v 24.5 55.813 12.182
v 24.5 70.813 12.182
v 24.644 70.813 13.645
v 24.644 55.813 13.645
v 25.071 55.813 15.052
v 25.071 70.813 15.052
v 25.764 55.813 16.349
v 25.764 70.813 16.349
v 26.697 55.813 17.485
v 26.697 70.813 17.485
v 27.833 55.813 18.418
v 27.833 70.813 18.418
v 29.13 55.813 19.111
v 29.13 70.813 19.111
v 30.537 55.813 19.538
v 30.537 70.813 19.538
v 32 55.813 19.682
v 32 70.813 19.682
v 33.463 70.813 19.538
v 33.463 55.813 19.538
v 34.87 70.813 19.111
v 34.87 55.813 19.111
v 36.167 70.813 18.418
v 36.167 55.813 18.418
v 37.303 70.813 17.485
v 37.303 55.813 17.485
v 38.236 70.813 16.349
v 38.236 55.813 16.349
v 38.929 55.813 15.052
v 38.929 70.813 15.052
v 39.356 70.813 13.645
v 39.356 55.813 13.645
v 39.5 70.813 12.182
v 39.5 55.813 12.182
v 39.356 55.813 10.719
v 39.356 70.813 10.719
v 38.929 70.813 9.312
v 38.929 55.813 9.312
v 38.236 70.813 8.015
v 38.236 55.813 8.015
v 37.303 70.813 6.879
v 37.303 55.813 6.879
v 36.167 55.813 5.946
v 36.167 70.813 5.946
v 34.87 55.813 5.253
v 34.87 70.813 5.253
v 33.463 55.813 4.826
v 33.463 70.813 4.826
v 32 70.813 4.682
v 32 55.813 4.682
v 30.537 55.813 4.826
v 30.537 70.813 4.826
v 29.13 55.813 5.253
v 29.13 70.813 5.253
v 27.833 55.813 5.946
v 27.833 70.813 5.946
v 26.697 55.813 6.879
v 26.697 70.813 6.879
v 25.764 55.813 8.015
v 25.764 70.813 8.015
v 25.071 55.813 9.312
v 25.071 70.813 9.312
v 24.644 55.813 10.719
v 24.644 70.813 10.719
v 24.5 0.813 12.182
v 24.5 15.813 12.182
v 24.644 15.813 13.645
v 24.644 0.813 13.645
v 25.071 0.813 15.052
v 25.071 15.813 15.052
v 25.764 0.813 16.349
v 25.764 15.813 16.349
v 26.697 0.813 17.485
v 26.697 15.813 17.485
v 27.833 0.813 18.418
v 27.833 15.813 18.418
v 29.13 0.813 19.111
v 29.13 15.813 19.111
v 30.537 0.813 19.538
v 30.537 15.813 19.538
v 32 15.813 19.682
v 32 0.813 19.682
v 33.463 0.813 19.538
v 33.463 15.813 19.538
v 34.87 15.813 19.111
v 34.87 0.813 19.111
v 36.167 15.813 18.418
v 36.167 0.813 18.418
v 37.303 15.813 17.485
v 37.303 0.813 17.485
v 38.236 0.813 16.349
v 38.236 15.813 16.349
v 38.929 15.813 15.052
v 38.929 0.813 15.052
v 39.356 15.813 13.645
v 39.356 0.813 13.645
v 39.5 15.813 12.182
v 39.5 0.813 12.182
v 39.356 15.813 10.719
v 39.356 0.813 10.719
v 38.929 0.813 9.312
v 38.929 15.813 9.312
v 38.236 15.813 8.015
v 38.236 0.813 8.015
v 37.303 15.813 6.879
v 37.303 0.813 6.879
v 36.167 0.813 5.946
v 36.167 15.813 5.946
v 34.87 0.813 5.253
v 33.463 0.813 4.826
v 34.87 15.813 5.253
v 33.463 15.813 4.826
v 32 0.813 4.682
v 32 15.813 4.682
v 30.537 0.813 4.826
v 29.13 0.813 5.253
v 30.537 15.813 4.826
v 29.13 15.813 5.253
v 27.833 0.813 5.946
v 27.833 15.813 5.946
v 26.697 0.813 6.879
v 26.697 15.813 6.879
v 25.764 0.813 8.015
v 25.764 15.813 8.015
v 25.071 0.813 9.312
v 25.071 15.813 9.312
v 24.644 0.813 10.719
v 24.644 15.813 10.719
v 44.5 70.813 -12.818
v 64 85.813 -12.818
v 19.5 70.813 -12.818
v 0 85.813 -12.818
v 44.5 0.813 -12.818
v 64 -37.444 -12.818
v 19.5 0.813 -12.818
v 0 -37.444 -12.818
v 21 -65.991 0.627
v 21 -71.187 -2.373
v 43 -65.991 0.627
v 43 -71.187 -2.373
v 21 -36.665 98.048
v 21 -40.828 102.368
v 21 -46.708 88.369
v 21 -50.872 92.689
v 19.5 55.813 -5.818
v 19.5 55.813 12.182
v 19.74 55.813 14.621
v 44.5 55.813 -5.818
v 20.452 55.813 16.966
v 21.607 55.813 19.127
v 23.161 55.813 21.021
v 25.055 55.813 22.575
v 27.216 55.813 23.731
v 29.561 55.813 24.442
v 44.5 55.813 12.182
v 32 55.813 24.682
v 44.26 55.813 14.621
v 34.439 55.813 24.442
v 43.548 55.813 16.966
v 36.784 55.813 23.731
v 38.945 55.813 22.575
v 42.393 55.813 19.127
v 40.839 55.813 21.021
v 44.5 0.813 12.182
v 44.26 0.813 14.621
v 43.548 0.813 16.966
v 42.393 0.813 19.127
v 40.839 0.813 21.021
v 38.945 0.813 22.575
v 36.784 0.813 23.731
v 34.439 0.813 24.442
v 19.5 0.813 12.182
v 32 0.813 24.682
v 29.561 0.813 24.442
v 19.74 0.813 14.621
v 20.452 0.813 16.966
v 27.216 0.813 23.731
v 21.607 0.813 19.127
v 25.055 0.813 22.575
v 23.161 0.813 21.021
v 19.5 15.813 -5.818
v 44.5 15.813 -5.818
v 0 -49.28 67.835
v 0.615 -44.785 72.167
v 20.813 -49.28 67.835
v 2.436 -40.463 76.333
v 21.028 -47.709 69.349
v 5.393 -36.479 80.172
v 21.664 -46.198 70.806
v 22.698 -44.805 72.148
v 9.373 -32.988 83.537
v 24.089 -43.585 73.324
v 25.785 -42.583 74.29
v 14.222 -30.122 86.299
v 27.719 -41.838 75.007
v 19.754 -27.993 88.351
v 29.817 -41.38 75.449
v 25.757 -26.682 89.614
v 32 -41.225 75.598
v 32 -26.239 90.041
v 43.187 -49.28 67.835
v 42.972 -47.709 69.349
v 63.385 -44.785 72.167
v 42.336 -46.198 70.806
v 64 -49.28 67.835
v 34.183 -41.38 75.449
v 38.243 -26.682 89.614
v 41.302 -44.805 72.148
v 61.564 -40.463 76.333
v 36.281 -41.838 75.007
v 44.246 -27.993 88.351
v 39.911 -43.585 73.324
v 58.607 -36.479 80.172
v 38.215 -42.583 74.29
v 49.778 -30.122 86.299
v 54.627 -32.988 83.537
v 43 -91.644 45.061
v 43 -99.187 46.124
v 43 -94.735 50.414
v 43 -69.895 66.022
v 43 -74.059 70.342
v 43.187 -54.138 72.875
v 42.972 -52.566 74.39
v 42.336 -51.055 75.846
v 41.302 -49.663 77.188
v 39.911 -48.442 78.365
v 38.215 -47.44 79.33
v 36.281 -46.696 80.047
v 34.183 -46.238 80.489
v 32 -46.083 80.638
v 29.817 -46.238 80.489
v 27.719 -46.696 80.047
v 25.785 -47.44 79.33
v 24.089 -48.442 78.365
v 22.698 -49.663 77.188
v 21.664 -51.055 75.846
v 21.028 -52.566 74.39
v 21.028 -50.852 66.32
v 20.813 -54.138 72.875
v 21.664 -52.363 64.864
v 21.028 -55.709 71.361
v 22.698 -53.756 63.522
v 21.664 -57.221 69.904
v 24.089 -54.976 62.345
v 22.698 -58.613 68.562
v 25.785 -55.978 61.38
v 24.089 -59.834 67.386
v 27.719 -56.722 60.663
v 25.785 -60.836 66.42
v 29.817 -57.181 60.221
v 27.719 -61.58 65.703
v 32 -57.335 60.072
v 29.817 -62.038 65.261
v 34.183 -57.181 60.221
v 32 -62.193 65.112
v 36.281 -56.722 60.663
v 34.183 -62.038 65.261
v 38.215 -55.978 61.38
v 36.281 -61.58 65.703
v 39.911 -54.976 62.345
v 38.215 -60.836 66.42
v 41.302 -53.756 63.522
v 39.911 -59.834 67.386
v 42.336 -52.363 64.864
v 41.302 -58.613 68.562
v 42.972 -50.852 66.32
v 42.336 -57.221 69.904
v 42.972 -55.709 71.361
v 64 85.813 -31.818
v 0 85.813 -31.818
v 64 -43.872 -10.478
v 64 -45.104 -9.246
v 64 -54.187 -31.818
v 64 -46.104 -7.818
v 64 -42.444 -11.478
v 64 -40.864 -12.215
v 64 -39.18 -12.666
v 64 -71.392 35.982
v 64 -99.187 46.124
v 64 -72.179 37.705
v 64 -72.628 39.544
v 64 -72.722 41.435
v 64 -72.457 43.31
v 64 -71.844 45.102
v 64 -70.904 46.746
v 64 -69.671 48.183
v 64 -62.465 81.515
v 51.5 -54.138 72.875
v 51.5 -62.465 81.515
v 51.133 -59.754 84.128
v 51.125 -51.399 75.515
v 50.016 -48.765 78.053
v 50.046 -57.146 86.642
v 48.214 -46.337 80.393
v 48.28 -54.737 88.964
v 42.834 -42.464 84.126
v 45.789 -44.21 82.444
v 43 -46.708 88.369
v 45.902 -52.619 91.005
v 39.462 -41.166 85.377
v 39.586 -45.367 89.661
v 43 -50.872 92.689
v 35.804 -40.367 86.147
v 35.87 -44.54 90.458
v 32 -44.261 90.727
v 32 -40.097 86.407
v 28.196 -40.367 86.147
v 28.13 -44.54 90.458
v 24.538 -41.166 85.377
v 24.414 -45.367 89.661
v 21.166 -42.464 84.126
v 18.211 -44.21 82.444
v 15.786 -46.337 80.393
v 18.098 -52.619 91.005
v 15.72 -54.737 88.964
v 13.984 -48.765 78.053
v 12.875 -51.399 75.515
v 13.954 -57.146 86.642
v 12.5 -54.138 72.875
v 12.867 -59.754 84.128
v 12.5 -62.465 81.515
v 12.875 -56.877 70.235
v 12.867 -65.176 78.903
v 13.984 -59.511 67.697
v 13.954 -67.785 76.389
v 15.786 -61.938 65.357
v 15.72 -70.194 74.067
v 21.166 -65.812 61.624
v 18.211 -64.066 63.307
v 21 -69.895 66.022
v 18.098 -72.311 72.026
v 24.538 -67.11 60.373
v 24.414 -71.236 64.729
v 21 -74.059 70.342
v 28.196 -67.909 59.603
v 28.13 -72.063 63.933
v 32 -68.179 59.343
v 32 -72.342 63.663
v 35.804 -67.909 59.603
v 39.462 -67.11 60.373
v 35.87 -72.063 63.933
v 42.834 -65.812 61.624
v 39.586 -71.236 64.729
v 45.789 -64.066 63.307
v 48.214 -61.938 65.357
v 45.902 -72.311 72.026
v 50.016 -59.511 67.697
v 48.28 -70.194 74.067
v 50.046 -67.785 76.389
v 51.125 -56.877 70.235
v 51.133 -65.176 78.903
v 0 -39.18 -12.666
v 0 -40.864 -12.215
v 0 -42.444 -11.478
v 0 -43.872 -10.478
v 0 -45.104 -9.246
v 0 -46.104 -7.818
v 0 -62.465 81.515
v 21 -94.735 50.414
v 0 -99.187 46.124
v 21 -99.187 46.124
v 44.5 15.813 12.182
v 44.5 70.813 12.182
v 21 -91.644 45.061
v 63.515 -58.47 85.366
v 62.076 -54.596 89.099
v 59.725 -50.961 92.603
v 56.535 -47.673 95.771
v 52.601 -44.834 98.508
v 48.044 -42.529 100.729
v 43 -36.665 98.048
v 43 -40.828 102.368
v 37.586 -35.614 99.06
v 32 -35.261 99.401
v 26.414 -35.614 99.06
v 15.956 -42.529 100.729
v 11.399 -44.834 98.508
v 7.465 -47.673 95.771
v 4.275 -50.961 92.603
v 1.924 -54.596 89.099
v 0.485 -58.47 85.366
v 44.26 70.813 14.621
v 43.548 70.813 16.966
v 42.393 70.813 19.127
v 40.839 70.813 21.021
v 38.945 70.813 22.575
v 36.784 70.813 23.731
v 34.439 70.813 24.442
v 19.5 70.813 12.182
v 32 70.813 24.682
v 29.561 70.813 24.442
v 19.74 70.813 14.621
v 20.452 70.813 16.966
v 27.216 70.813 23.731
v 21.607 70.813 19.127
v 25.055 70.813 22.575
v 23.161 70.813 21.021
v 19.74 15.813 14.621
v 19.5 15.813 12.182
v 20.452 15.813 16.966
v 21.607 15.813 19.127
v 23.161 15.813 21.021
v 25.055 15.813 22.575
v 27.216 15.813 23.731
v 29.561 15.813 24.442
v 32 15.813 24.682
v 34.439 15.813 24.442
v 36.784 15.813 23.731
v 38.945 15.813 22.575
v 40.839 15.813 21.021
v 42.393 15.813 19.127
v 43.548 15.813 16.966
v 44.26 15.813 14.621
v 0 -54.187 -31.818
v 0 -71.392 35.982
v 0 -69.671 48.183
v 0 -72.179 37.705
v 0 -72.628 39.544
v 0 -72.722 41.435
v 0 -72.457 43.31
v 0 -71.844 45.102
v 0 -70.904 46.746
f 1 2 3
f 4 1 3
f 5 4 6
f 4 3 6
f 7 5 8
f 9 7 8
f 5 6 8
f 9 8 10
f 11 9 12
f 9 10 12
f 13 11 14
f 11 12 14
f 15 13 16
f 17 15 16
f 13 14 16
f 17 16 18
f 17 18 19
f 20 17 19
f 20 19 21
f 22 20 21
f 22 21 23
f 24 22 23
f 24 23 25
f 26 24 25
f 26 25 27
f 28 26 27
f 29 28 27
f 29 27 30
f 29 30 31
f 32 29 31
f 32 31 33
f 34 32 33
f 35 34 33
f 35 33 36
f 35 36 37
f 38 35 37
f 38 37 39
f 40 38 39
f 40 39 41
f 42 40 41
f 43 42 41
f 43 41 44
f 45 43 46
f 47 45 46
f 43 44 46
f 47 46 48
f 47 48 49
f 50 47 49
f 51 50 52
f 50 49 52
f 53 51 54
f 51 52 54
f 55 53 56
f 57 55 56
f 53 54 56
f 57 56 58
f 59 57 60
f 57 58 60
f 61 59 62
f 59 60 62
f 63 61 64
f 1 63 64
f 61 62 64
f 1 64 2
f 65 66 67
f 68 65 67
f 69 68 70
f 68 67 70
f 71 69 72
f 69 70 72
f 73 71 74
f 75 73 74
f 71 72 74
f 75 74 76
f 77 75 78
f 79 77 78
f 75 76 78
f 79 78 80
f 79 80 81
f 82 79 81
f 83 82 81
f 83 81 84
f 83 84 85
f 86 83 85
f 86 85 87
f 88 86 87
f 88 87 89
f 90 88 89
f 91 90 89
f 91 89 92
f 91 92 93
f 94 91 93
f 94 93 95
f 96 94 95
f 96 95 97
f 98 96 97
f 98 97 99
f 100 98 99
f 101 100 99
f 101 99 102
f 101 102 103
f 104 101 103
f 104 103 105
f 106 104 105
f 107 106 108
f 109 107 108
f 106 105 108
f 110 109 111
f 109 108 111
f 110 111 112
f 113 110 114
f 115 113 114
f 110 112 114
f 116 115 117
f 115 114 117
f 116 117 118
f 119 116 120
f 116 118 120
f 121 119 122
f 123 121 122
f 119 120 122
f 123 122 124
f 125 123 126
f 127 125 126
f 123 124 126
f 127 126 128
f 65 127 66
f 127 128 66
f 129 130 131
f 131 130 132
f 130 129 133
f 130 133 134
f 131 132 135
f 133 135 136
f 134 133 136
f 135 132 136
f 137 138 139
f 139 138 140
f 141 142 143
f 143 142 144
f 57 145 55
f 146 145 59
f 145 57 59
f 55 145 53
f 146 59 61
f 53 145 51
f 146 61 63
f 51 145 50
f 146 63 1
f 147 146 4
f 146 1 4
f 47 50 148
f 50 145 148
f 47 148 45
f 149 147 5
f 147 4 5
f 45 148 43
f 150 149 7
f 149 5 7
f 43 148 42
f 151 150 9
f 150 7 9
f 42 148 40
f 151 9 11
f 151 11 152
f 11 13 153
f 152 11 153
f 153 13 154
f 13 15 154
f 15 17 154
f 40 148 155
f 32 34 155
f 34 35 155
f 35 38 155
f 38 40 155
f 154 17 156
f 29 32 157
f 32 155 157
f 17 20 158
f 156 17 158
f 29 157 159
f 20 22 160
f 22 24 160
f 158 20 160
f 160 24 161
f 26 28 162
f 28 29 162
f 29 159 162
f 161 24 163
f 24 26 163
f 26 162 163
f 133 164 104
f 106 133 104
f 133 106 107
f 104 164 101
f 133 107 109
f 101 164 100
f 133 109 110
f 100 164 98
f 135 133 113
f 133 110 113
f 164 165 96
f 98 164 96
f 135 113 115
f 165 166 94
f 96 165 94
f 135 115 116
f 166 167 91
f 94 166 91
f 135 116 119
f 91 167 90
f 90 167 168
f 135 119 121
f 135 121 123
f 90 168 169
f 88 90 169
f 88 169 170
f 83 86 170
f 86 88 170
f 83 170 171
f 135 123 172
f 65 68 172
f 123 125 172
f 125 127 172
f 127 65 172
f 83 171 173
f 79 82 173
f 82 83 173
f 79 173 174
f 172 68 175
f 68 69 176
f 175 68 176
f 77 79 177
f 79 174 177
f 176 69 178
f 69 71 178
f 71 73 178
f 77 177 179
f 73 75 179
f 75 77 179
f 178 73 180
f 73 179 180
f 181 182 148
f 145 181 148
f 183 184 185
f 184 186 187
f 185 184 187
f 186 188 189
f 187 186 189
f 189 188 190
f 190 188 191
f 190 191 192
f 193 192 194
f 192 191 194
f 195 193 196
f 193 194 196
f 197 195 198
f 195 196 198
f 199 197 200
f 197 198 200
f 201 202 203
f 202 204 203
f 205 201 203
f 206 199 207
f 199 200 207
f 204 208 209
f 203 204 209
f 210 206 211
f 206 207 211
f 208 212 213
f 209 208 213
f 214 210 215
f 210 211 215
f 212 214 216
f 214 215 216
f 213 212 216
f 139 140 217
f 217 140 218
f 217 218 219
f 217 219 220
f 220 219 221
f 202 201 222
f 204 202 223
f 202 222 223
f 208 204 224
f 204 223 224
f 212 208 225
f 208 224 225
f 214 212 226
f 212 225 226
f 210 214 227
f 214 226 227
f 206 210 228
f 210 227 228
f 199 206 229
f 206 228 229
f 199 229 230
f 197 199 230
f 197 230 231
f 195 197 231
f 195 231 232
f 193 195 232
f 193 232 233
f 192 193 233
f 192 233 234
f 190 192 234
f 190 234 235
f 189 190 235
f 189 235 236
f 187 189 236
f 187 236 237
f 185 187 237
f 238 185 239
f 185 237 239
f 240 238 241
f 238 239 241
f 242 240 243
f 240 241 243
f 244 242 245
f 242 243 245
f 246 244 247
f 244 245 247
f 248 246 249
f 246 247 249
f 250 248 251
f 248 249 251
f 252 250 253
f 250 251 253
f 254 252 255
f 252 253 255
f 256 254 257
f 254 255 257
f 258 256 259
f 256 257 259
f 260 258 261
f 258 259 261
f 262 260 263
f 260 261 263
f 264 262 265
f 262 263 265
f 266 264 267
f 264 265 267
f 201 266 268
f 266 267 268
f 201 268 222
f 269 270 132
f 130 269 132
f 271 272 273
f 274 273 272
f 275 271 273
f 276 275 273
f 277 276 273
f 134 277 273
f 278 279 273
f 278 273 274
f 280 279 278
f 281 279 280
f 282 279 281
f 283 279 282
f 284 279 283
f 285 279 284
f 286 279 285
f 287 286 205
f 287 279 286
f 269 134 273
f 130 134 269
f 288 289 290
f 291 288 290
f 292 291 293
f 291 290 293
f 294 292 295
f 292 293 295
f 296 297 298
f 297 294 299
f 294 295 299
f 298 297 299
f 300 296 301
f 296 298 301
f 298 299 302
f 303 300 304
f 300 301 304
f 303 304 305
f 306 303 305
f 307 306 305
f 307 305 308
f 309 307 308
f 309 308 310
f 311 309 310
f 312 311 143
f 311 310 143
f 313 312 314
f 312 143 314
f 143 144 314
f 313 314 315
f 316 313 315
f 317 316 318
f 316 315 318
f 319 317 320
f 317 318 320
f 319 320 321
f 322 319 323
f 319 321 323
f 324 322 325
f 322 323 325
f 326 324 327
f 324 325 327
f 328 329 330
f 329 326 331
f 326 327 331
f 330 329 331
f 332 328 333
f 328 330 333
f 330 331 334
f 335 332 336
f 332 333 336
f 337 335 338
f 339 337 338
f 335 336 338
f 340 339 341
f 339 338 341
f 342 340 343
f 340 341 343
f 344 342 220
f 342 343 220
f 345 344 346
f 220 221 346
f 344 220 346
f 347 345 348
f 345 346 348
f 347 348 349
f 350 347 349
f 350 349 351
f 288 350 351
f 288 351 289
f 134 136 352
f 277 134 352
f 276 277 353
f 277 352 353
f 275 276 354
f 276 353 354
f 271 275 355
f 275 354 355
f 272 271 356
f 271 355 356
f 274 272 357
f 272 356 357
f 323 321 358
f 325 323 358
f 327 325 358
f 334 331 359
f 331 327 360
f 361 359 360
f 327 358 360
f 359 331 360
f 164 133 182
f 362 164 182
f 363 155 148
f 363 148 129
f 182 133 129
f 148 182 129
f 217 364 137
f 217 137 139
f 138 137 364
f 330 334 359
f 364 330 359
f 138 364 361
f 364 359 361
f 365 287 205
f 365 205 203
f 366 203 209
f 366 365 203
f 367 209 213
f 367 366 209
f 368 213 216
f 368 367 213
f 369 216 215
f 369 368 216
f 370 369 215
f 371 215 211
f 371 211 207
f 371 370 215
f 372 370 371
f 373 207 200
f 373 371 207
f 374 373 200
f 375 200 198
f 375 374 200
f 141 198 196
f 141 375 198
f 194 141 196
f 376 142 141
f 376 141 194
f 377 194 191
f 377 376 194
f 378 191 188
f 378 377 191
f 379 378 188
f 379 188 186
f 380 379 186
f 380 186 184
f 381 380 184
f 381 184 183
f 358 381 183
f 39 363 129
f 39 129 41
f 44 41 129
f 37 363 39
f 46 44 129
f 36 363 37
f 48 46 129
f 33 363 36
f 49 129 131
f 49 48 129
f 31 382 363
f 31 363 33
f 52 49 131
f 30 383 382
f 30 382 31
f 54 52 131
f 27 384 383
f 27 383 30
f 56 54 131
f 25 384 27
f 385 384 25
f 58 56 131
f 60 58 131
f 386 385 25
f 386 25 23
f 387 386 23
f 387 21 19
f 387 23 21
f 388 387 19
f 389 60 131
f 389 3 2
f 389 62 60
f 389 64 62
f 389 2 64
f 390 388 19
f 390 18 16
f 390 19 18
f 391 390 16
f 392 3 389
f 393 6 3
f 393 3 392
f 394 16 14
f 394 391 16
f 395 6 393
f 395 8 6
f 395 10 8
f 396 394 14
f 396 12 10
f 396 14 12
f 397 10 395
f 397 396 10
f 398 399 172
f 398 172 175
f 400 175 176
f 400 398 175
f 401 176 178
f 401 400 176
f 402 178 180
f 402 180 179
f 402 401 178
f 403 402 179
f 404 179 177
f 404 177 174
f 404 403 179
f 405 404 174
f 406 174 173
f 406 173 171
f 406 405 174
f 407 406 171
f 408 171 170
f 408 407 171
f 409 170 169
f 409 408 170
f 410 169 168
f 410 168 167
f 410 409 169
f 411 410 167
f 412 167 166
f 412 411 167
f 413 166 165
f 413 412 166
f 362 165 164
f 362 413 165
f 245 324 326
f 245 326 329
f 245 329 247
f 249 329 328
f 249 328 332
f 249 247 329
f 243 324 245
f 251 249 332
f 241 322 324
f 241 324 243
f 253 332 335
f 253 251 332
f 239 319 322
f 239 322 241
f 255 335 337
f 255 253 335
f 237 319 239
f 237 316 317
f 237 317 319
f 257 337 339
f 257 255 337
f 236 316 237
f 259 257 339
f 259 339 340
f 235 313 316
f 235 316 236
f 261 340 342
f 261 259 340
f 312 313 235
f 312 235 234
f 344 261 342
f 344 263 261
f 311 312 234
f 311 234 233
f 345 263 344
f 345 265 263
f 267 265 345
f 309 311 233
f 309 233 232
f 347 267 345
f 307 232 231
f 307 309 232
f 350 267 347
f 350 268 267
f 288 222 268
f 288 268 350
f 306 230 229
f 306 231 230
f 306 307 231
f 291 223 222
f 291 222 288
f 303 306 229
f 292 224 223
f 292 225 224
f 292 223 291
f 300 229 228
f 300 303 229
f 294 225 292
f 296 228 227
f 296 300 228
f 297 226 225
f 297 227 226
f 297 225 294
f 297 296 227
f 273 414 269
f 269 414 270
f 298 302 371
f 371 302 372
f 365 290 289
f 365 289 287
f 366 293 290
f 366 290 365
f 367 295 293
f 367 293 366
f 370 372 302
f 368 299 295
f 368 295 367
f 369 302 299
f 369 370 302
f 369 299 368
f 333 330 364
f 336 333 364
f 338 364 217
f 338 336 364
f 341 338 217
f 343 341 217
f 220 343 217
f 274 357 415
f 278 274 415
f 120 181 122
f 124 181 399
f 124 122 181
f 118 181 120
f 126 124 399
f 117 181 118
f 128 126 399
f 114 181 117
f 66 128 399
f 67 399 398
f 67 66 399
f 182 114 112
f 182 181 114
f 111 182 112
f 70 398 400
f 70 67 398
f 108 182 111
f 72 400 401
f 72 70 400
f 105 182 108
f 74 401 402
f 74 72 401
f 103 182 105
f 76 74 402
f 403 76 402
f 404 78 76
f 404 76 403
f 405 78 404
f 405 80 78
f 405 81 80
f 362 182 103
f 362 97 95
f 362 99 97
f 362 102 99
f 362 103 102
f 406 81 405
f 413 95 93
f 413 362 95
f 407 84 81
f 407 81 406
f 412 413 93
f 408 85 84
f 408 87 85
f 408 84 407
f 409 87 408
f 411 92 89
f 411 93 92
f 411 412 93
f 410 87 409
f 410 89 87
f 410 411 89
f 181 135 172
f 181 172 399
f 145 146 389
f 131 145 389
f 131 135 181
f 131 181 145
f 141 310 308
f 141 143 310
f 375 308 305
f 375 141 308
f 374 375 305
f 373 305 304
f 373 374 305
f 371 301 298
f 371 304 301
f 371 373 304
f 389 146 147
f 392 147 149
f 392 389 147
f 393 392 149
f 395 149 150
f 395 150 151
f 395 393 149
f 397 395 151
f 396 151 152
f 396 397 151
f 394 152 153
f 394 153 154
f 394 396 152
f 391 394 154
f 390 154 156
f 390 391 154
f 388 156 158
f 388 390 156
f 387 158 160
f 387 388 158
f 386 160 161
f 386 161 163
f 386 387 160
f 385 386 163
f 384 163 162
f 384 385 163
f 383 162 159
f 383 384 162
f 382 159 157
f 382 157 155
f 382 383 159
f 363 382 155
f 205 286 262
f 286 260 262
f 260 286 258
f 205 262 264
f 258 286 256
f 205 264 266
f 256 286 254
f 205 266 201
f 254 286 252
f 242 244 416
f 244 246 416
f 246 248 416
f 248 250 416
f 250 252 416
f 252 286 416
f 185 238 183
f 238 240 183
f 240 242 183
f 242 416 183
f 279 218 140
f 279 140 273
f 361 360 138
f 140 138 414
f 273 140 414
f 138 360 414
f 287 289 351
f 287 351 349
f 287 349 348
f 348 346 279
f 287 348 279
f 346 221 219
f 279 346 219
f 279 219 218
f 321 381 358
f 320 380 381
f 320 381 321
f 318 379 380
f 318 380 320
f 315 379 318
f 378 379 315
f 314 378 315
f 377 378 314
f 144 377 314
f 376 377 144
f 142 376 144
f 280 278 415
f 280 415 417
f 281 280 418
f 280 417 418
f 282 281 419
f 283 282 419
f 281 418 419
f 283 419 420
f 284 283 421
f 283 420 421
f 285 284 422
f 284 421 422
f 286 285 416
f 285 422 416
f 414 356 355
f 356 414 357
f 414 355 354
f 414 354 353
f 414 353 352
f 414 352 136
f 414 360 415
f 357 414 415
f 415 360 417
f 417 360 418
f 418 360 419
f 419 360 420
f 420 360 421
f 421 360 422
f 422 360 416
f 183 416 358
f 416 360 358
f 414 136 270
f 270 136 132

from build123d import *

# Parameters (mm, degrees)
F1_DEPTH  = 64
F4_DEPTH  = 19
F6_DEPTH  = 6
F8_DEPTH  = 6
F9_R      = 19.5
F10_DEPTH = 12
F11_R     = 11.1871907606
F12_DEPTH = 25
F13_W     = 12.5
F13_H     = 70
F14_DEPTH = 25
F16_DEPTH = 70
F17_R     = 7.5
F18_DEPTH = 70
F19_W     = 40
F19_H     = 38.5815599019
F20_DEPTH = 44.501


with BuildPart() as f1:
    # F0 (on Right) → F1 (new body)
    with BuildSketch(Plane.YZ):
        with BuildLine():
            Line((-54.1868201462, -31.8179203436), (85.8131798538, -31.8179203436))
            Line((85.8131798538, -31.8179203436), (85.8131798538, -12.8179203436))
            Line((85.8131798538, -12.8179203436), (-37.4436623397, -12.8179203436))
            ThreePointArc((-37.4436623397, -12.8179203436), (-42.4436623397, -11.4781743814), (-46.1039163775, -7.8179203436))
            Line((-46.1039163775, -7.8179203436), (-71.3920766998, 35.9824581646))
            ThreePointArc((-71.3920766998, 35.9824581646), (-72.6338098814, 42.3791145671), (-69.671246979, 48.1827630296))
            Line((-69.671246979, 48.1827630296), (-49.2803591326, 67.8348507705))
            Line((-49.2803591326, 67.8348507705), (-62.4652653349, 81.5154300139))
            Line((-62.4652653349, 81.5154300139), (-99.1868201462, 46.124365997))
            Line((-99.1868201462, 46.124365997), (-54.1868201462, -31.8179203436))
        make_face()
    extrude(amount=F1_DEPTH)

    # F3 (on face) → F4 (join)
    with BuildSketch(Plane(origin=(0, -70.8105053198, 73.4725537235), x_dir=(1, 0, 0), z_dir=(0, -0.6939424317, 0.7200304865))):
        with BuildLine():
            Line((0, 11.5901203371), (64, 11.5901203371))
            ThreePointArc((64, 11.5901203371), (32, 43.5901203371), (0, 11.5901203371))
        make_face()
    extrude(amount=-F4_DEPTH)

    # F2 (on face) → F6 (cut)
    with BuildSketch(Plane(origin=(0, -54.4176787662, -31.4180614843), x_dir=(1, 0, 0), z_dir=(0, -0.8660254038, -0.5))):
        Polygon((21, 113.3266016841), (21, 89.53828276), (21, 33.53828276), (43, 33.53828276), (43, 89.53828276), (43, 113.3266016841), align=None)
    extrude(amount=-F6_DEPTH, mode=Mode.SUBTRACT)

    # F7 (on face) → F8 (cut)
    with BuildSketch(Plane(origin=(0, -70.8105053198, 73.4725537235), x_dir=(1, 0, 0), z_dir=(0, -0.6939424317, 0.7200304865))):
        with BuildLine():
            Line((21, 41.6400787397), (21, -39.4098796629))
            Line((21, -39.4098796629), (43, -39.4098796629))
            Line((43, -39.4098796629), (43, 41.6400787397))
            ThreePointArc((43, 41.6400787397), (32, 43.5901203371), (21, 41.6400787397))
        make_face()
    extrude(amount=-F8_DEPTH, mode=Mode.SUBTRACT)

    # F9 (on face) → F10 (cut)
    with BuildSketch(Plane(origin=(0, -70.8105053198, 73.4725537235), x_dir=(1, 0, 0), z_dir=(0, -0.6939424317, 0.7200304865))):
        with Locations((32, 11.5901203371)):
            Circle(F9_R)
    extrude(amount=-F10_DEPTH, mode=Mode.SUBTRACT)

    # F11 (on face) → F12 (cut)
    with BuildSketch(Plane(origin=(0, -70.8105053198, 73.4725537235), x_dir=(1, 0, 0), z_dir=(0, -0.6939424317, 0.7200304865))):
        with Locations((32, 11.5901203371)):
            Circle(F11_R)
    extrude(amount=-F12_DEPTH, mode=Mode.SUBTRACT)

    # F13 (on face) → F14 (join)
    with BuildSketch(Plane.XY.offset(-12.8179203436)):
        with Locations((25.75, 35.8131798538)):
            Rectangle(F13_W, F13_H)
        with Locations((38.25, 35.8131798538)):
            Rectangle(F13_W, F13_H)
    extrude(amount=F14_DEPTH)

    # F15 (on face) → F16 (join, through all)
    with BuildSketch(Plane(origin=(0, 70.8131798538, 0), x_dir=(-1, 0, 0), z_dir=(0, 1, 0))):
        with BuildLine():
            Line((-44.5, 12.1820796564), (-19.5, 12.1820796564))
            ThreePointArc((-19.5, 12.1820796564), (-32, 24.6820796564), (-44.5, 12.1820796564))
        make_face()
    extrude(amount=-F16_DEPTH)

    # F17 (on face) → F18 (cut, through all)
    with BuildSketch(Plane(origin=(0, 70.8131798538, 0), x_dir=(-1, 0, 0), z_dir=(0, 1, 0))):
        with Locations((-32, 12.1820796564)):
            Circle(F17_R)
    extrude(amount=-F18_DEPTH, mode=Mode.SUBTRACT)

    # F19 (on face) → F20 (cut, through all)
    with BuildSketch(Plane.YZ.offset(44.5)):
        with Locations((35.8131798538, 13.4728596074)):
            Rectangle(F19_W, F19_H)
    extrude(amount=-F20_DEPTH, mode=Mode.SUBTRACT)


solid = f1.part
